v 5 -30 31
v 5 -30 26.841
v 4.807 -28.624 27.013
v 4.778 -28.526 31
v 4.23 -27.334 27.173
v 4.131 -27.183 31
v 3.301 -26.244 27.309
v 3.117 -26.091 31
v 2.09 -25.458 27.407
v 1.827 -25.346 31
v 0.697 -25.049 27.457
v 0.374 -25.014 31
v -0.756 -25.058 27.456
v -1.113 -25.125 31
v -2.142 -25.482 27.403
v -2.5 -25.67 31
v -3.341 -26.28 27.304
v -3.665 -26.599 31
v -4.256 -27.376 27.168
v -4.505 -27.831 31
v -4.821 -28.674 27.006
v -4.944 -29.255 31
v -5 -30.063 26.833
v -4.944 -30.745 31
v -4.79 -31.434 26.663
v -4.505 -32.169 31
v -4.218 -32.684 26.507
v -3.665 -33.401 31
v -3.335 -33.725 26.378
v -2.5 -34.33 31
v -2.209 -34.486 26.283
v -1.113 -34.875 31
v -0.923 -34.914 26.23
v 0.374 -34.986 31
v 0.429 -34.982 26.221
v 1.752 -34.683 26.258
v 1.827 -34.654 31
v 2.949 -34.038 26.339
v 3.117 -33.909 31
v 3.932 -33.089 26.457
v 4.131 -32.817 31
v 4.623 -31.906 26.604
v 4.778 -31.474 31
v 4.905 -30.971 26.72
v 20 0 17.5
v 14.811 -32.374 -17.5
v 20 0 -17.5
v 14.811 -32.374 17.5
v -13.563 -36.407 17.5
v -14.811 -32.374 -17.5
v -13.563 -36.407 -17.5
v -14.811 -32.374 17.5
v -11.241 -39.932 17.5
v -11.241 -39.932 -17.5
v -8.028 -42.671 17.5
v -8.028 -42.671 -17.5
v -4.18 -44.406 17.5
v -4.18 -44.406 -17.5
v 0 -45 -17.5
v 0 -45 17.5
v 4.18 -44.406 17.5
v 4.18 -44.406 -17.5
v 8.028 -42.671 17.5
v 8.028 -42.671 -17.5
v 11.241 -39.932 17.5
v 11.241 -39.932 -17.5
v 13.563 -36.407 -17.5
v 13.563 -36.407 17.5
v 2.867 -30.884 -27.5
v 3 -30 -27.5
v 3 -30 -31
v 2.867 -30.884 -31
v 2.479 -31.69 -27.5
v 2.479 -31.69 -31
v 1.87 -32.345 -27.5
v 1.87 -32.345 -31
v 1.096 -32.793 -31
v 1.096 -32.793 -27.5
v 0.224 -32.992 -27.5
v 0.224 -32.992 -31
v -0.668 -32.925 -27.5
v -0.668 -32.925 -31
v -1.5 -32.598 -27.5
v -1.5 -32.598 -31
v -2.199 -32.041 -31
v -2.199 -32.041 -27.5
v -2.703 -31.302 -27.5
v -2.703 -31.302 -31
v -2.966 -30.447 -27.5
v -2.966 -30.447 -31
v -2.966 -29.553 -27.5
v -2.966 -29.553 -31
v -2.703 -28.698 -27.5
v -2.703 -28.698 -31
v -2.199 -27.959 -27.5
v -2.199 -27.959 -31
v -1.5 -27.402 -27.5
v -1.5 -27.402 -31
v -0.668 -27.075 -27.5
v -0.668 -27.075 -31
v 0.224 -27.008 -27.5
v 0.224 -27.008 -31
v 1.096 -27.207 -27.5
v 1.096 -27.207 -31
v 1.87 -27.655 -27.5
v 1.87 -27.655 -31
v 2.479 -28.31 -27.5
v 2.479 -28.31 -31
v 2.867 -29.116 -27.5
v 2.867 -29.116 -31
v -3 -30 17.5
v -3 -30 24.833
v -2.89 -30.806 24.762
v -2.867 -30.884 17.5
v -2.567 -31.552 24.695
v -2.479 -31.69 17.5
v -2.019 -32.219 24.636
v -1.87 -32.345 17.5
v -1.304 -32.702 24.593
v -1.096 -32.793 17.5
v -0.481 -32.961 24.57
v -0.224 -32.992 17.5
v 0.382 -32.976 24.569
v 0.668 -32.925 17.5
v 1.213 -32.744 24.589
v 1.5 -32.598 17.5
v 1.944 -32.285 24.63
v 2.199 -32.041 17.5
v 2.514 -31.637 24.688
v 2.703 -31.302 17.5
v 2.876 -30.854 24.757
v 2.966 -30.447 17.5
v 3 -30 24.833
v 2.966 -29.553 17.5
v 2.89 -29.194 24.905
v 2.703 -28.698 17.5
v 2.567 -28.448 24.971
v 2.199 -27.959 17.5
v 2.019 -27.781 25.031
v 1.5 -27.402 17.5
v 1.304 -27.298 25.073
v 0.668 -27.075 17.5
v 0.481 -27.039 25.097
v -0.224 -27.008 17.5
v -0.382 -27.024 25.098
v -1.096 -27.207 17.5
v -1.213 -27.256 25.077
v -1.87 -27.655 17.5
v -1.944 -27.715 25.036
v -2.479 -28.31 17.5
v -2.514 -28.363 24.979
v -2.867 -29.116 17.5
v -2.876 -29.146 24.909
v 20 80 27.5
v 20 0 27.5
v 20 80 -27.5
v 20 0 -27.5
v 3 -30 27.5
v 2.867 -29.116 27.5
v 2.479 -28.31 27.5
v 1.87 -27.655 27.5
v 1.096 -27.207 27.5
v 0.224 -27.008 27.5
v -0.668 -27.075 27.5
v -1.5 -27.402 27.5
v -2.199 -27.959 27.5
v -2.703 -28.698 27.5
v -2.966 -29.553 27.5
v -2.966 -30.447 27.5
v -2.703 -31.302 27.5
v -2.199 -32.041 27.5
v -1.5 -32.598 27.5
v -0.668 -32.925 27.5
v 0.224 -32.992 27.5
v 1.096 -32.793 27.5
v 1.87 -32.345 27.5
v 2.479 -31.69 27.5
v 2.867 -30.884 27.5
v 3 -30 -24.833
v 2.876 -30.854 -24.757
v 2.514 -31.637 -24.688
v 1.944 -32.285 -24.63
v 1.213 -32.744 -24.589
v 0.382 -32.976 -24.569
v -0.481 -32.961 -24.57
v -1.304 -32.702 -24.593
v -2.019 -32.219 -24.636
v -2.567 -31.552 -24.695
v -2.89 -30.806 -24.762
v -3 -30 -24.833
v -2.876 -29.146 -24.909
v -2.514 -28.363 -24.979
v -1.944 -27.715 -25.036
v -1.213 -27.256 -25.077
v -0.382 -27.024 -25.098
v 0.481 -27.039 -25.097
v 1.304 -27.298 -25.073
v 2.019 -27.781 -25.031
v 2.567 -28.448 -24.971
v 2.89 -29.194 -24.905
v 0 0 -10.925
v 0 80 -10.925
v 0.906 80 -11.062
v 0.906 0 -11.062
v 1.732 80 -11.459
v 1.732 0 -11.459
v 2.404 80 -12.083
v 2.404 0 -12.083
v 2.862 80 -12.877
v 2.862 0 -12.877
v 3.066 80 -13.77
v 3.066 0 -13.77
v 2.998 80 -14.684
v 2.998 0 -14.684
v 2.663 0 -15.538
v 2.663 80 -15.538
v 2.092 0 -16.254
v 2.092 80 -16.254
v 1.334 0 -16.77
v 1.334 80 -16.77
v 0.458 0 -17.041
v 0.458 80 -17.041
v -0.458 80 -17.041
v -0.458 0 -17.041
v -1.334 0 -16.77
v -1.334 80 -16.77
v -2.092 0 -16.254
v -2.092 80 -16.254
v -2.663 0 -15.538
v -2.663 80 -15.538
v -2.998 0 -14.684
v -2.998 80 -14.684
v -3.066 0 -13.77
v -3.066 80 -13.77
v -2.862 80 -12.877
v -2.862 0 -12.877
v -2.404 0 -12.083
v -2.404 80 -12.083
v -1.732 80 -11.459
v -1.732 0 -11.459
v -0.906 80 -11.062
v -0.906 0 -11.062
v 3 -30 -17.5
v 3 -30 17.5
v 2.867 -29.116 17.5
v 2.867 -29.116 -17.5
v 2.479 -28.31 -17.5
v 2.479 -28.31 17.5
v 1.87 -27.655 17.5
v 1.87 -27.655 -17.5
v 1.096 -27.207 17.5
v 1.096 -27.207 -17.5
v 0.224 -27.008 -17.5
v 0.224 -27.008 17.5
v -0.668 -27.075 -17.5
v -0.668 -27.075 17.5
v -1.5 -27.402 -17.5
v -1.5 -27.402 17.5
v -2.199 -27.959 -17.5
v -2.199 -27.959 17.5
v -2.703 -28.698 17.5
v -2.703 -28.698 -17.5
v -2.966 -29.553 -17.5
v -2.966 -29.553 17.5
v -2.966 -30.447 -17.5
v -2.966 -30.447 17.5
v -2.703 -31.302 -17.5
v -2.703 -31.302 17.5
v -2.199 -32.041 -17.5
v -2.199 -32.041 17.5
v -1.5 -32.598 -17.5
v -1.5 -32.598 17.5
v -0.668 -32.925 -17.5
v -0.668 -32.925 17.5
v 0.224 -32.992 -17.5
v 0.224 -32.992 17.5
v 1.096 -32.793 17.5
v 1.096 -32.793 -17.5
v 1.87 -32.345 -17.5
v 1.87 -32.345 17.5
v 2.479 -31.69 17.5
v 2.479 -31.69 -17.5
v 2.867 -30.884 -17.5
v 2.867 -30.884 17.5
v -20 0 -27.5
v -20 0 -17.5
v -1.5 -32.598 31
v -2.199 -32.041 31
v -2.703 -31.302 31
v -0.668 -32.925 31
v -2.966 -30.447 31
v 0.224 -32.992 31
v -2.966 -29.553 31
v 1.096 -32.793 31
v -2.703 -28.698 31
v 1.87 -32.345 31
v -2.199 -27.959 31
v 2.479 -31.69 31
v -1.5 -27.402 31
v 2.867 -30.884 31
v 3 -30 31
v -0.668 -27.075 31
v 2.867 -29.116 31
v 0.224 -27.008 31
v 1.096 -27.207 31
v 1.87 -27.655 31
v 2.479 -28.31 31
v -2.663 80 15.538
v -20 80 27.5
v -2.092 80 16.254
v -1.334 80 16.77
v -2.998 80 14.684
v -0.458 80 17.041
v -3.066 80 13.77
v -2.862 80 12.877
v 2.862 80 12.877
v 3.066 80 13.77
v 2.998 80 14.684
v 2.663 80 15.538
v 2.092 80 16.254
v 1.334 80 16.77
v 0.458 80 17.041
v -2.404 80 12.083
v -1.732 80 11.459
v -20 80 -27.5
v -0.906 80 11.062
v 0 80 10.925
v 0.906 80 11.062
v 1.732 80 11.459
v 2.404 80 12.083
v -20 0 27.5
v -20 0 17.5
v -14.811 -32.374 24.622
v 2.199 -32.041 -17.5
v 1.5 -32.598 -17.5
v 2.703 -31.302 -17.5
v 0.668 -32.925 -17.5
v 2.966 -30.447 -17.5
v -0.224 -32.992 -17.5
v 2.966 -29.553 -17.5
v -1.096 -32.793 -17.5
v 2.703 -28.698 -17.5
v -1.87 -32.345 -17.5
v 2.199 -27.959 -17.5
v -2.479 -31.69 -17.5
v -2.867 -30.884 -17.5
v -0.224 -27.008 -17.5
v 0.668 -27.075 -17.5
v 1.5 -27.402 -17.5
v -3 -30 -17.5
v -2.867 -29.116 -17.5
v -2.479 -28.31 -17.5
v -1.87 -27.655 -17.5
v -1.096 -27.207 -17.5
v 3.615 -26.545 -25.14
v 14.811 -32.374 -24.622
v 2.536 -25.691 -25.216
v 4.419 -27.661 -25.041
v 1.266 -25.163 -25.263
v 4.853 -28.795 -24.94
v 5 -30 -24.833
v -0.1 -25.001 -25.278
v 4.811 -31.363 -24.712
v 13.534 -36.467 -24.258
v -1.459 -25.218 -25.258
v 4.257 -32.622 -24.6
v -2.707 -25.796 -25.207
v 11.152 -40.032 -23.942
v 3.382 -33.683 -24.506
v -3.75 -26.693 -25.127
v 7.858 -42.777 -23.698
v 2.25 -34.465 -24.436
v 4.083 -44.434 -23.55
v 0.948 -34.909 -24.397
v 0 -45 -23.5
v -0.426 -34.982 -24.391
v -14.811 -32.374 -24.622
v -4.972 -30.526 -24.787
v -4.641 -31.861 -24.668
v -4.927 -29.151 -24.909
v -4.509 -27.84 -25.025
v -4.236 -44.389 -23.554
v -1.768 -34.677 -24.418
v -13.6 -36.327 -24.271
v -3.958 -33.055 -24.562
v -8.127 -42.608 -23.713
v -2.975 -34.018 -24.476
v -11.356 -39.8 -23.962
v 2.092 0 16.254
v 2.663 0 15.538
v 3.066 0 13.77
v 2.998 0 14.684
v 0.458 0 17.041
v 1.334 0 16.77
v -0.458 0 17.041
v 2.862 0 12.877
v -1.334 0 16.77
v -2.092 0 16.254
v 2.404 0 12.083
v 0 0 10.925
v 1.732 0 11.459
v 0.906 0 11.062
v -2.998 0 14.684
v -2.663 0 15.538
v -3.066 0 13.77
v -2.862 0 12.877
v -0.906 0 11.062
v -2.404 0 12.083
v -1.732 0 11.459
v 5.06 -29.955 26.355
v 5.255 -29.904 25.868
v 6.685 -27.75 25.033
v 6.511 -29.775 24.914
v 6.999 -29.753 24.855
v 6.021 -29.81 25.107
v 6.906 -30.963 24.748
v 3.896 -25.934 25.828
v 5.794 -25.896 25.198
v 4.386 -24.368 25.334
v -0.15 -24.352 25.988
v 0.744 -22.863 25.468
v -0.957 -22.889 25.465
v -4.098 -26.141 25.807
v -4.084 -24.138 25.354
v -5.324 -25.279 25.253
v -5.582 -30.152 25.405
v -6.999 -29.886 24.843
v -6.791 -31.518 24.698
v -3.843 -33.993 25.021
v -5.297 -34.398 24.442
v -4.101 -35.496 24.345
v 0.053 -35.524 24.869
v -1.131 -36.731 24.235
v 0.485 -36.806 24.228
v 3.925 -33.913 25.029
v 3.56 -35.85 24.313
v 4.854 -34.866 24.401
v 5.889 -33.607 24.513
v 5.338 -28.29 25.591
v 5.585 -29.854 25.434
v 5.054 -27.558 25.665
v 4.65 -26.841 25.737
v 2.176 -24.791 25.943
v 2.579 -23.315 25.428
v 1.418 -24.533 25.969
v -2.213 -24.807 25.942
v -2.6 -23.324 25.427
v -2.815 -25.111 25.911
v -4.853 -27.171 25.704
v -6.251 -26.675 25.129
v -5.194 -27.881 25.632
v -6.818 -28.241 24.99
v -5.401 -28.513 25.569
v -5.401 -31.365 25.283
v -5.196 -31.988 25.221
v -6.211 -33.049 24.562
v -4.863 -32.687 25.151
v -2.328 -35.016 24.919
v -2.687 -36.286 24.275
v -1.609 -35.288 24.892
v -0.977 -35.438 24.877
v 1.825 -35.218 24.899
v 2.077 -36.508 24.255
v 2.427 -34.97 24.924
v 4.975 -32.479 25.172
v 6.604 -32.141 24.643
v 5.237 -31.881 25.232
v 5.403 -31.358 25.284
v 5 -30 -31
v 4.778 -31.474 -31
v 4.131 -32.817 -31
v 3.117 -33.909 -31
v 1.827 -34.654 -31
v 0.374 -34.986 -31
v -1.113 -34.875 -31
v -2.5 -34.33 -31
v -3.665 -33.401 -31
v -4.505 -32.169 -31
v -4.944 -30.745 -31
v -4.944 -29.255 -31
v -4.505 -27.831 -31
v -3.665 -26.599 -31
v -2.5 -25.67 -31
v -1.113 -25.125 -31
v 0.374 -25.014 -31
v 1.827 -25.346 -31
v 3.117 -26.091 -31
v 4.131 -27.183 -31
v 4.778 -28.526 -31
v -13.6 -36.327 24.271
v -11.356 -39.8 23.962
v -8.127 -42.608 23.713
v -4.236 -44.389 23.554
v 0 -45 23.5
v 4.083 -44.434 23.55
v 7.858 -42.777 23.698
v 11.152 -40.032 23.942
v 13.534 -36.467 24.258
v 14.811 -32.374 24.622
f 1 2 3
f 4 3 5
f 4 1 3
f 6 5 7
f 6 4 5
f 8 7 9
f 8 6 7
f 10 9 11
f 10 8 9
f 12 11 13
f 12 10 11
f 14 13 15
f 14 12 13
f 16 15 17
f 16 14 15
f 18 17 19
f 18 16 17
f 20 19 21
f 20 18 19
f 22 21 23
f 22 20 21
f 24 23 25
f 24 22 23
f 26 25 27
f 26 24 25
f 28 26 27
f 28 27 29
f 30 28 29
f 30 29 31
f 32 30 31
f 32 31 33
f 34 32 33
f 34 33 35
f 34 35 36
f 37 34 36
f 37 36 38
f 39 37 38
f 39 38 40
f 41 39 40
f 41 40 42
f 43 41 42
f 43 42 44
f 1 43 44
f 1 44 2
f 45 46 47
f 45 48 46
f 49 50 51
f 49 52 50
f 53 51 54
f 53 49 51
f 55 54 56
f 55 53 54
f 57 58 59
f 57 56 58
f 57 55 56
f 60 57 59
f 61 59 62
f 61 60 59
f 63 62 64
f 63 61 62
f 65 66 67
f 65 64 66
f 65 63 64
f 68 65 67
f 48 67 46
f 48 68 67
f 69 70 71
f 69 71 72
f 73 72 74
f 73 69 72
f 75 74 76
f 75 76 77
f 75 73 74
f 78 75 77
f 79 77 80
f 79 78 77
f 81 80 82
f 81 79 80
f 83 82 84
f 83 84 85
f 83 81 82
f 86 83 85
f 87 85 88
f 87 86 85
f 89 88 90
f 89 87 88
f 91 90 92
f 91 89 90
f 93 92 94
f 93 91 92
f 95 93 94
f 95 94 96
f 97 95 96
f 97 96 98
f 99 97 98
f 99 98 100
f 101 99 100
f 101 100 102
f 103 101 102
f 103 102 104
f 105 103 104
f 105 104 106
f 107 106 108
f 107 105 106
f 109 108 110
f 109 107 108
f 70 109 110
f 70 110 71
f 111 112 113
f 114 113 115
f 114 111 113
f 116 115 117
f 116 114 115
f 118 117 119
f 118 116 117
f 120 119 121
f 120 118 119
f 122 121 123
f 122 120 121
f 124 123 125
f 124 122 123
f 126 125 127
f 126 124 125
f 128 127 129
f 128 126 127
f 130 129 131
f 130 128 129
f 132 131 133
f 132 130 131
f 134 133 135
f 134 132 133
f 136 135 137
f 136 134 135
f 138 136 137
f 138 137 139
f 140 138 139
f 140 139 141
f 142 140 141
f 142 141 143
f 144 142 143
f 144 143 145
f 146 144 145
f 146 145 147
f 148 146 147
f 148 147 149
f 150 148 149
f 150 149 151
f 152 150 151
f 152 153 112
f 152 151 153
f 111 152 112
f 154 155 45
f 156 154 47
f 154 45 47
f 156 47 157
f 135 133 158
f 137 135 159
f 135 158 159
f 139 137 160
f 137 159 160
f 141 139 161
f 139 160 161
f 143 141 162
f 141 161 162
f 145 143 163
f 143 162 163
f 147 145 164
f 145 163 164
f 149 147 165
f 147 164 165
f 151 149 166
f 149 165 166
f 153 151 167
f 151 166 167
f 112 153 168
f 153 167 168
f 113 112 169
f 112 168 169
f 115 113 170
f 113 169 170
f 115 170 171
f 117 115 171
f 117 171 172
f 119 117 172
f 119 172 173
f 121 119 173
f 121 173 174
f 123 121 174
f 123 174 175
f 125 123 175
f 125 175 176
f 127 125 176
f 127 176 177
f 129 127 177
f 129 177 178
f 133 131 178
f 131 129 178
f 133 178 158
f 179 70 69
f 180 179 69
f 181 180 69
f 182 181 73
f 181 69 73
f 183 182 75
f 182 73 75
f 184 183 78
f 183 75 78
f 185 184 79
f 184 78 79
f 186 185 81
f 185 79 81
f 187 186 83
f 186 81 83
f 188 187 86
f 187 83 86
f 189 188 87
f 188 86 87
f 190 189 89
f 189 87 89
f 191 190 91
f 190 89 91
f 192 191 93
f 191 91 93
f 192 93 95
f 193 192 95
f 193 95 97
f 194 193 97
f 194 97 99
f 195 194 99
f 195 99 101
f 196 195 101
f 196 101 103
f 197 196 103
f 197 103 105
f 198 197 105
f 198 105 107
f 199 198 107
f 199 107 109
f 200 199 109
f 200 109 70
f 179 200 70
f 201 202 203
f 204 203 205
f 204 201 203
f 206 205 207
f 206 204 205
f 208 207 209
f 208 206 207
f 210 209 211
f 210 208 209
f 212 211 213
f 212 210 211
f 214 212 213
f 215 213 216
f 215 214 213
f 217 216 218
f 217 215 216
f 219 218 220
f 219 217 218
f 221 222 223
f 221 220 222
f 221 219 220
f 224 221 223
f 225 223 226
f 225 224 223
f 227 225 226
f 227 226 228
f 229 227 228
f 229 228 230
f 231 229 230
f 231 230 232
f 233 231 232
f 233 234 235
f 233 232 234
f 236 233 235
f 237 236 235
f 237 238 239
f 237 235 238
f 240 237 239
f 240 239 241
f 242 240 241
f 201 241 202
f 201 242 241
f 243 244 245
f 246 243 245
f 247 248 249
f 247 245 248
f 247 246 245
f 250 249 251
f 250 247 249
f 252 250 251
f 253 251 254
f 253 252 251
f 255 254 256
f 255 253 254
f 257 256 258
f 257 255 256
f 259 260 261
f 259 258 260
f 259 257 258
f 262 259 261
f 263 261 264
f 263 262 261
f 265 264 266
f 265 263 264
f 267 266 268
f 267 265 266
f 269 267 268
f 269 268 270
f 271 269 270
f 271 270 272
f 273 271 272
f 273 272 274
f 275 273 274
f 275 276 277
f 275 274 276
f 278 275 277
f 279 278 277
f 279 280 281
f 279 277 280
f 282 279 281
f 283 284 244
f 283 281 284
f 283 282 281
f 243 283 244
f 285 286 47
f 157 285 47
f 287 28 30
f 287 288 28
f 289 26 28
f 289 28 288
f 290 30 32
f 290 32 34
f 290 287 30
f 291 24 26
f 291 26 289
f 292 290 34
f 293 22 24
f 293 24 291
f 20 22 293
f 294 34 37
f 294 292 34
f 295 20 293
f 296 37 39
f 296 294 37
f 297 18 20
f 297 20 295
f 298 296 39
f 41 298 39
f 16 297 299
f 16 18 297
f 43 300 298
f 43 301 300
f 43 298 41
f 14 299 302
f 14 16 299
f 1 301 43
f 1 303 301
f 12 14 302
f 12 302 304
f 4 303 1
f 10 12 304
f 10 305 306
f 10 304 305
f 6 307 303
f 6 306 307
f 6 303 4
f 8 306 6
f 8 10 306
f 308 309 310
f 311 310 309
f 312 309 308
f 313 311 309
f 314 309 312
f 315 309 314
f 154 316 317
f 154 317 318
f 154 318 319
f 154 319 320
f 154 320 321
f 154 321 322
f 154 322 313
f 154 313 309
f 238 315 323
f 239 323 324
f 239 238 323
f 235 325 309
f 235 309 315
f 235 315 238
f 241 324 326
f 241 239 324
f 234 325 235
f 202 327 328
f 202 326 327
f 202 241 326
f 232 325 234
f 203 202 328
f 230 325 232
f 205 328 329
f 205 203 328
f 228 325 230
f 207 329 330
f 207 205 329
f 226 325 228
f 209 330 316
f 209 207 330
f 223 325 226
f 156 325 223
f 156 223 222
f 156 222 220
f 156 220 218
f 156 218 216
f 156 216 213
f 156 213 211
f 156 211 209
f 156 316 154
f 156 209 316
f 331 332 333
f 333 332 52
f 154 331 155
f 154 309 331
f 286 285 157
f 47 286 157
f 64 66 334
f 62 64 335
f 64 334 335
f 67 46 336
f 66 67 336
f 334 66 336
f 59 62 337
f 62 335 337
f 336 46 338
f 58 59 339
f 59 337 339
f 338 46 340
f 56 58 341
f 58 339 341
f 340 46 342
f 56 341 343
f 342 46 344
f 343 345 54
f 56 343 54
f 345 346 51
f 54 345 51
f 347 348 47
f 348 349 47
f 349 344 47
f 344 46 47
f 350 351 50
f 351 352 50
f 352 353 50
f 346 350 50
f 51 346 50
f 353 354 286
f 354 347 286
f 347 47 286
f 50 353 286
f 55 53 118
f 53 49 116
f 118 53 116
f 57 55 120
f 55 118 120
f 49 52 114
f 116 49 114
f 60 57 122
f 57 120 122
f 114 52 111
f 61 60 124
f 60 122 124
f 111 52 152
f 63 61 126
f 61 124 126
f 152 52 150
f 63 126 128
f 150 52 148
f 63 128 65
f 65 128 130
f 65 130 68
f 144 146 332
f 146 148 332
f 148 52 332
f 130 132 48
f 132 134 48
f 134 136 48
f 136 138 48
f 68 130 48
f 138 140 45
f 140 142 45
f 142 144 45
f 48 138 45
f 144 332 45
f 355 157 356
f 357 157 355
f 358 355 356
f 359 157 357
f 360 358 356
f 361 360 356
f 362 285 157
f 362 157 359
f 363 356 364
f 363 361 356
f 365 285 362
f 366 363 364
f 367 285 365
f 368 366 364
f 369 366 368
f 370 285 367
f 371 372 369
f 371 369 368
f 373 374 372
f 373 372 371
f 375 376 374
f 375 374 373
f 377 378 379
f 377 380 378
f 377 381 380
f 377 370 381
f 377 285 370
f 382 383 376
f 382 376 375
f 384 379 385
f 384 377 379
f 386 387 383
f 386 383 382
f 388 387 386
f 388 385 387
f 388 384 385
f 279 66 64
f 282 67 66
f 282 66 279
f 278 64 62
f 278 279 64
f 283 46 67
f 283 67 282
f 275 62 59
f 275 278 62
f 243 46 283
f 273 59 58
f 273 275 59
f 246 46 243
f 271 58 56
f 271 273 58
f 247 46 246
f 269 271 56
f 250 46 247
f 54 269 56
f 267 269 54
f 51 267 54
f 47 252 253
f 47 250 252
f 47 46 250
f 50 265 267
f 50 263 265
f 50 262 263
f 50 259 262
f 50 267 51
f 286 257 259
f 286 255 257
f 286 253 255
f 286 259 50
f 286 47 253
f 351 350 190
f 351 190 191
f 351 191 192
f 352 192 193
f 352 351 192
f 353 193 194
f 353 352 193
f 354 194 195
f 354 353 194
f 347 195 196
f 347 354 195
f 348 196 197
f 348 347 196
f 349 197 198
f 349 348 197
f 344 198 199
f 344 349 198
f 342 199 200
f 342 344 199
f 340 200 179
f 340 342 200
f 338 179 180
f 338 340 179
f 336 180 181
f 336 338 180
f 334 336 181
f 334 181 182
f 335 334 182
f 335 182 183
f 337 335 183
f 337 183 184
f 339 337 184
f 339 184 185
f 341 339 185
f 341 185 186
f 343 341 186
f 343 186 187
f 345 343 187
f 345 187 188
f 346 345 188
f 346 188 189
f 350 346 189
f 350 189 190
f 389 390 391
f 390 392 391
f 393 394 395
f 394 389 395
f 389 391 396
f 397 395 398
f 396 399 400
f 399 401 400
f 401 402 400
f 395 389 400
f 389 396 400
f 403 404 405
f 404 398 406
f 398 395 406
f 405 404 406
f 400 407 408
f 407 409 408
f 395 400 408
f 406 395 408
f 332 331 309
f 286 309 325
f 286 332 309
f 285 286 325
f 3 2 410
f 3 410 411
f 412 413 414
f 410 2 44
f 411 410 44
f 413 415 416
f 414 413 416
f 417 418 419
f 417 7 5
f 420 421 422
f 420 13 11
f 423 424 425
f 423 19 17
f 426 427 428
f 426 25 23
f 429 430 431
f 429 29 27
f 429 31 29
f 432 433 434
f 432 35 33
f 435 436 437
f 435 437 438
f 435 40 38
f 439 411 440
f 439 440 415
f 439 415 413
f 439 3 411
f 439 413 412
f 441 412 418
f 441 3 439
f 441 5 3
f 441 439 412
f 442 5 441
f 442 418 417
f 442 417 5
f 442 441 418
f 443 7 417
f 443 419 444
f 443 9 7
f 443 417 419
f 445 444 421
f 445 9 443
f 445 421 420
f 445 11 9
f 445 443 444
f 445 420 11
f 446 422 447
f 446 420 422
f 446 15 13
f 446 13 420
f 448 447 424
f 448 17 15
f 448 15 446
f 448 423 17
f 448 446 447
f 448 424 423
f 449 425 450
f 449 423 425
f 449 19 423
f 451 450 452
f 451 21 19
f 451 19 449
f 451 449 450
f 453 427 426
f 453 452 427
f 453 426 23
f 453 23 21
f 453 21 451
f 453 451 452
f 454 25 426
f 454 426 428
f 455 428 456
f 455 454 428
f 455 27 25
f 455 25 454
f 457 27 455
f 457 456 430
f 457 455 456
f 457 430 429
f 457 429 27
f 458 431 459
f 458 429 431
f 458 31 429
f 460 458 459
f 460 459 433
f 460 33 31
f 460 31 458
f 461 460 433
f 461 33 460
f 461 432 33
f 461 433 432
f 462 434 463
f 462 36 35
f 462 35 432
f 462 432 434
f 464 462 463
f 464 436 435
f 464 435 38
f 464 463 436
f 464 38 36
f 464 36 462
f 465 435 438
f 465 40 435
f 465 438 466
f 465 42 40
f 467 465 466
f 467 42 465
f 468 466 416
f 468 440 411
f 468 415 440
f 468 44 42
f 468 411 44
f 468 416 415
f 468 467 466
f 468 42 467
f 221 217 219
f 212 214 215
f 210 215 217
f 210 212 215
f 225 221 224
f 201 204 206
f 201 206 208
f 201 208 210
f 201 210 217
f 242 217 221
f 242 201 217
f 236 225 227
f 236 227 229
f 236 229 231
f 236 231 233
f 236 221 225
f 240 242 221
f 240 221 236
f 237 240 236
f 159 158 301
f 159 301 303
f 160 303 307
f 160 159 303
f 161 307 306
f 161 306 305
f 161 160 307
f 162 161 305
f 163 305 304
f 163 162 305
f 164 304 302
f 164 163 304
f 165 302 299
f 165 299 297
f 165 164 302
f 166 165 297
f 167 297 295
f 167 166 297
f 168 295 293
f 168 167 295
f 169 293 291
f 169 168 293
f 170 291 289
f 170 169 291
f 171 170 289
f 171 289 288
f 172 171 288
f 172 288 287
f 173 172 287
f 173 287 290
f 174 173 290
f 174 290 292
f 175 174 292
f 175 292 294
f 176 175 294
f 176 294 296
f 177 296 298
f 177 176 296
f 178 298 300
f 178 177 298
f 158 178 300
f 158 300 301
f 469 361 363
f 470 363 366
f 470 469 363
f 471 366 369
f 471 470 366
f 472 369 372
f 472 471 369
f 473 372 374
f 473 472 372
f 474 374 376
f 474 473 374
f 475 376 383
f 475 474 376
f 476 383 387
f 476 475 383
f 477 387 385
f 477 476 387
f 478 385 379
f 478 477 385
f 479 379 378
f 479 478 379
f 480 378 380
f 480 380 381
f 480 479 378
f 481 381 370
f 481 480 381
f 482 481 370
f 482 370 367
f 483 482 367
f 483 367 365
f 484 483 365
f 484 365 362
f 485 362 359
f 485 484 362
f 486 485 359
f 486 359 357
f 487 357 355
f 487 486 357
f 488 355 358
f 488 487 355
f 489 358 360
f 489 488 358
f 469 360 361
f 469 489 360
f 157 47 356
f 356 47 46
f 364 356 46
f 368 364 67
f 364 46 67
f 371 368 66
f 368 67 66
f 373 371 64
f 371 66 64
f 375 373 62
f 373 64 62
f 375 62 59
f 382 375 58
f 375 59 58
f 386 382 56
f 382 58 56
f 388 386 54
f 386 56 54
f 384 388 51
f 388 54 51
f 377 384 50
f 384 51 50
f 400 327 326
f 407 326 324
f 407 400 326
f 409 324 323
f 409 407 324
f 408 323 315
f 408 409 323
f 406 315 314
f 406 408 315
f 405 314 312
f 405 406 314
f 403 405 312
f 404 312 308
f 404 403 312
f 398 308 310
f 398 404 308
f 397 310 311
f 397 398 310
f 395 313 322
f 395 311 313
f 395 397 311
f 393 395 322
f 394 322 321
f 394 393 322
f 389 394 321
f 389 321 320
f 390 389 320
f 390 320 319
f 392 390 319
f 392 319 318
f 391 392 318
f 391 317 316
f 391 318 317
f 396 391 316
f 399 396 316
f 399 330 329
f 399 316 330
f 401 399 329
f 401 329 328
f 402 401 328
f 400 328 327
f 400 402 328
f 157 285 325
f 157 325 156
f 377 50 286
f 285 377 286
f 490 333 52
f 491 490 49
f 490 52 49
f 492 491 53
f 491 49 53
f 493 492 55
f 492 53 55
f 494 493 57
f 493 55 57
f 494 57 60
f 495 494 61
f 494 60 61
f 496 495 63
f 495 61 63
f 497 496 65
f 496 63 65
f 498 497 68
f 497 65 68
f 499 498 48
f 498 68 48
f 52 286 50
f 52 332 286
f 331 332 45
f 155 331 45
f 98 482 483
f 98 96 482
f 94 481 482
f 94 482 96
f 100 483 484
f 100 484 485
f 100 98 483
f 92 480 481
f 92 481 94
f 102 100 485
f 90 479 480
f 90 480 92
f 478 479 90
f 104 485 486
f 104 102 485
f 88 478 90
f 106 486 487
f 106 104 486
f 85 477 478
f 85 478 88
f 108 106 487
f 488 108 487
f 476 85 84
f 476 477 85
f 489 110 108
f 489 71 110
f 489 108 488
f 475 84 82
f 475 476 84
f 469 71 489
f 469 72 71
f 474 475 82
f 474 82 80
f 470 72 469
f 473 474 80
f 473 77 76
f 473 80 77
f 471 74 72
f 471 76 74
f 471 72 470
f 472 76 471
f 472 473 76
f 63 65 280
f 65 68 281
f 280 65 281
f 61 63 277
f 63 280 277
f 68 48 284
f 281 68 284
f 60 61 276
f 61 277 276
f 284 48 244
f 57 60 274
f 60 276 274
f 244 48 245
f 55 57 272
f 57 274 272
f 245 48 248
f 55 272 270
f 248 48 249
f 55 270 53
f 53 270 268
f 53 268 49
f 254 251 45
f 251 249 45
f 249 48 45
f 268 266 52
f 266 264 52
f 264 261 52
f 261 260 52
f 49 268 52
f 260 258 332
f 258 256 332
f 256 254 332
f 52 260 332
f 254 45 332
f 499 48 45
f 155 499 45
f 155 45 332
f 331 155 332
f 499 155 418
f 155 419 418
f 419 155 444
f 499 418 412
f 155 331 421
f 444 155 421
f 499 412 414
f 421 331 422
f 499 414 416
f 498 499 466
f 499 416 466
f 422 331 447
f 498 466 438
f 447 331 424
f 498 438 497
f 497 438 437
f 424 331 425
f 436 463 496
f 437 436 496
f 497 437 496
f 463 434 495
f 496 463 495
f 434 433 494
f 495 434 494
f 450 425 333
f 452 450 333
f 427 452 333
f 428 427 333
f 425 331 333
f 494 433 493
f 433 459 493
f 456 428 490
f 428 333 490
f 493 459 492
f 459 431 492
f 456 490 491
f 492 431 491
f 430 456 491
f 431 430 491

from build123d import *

# Parameters (mm, degrees)
CROQUIS1_W                          = 40
CROQUIS1_H                          = 55
SALIENTE_EXTRUIR1_DEPTH             = 80
CROQUIS2_R                          = 3.075
CORTAR_EXTRUIR2_DEPTH               = 87.926693254
SALIENTE_EXTRUIR2_REACH             = 88.927
SALIENTE_EXTRUIR2_DIRECTION_2_REACH = 88.927
CORTAR_EXTRUIR6_DEPTH               = 87.926693254
CORTAR_EXTRUIR6_DEPTH_BACK          = 87.926693254
CROQUIS6_R                          = 3
CORTAR_EXTRUIR10_DEPTH              = 10
CROQUIS11_R                         = 3
SALIENTE_EXTRUIR3_DEPTH             = 10
CORTAR_EXTRUIR11_DEPTH              = 87.926693254
CORTAR_EXTRUIR11_DEPTH_BACK         = 87.926693254
CORTAR_EXTRUIR15_START              = -10
CORTAR_EXTRUIR15_DEPTH              = 10
CROQUIS17_R                         = 3
SALIENTE_EXTRUIR4_DEPTH             = 10
CORTAR_EXTRUIR16_DEPTH              = 87.926693254
CORTAR_EXTRUIR16_DEPTH_BACK         = 87.926693254
CROQUIS21_R                         = 5
CROQUIS21_R_2                       = 3
SALIENTE_EXTRUIR5_DEPTH             = 3.5
SALIENTE_EXTRUIR5_DIRECTION_2_REACH = 101.121
REDONDEO1_R                         = 2
CROQUIS22_R                         = 5
CROQUIS22_R_2                       = 3
SALIENTE_EXTRUIR6_DEPTH             = 3.5
SALIENTE_EXTRUIR6_DIRECTION_2_REACH = 103.105


with BuildPart() as part:
    # Croquis1 → Saliente-Extruir1 (new body)
    with BuildSketch(Plane(origin=(0, 0, 0), x_dir=(1, 0, 0), z_dir=(0, 1, 0))):
        Rectangle(CROQUIS1_W, CROQUIS1_H)
    extrude(amount=SALIENTE_EXTRUIR1_DEPTH)

    # Croquis2 → Cortar-Extruir2 (cut, through all)
    with BuildSketch(Plane(origin=(0, 0, 0), x_dir=(1, 0, 0), z_dir=(0, 1, 0))):
        with Locations(Location((0, 14, 0), (0, 0, 270))):
            Circle(CROQUIS2_R)
        with Locations(Location((0, -14, 0), (0, 0, 90))):
            Circle(CROQUIS2_R)
    extrude(amount=CORTAR_EXTRUIR2_DEPTH, mode=Mode.SUBTRACT)

    # Saliente-Extruir2: up to this face of the body (flat: up to its plane)
    saliente_extruir2_end = Plane(part.part.faces().sort_by_distance((0, 40, 27.5))[0])
    # Croquis5 → Saliente-Extruir2 (add, up to the picked face)
    with BuildSketch(Plane.XY, mode=Mode.PRIVATE) as saliente_extruir2_sk1:
        with BuildLine():
            Line((-20, 0), (-14.810951292, -32.373967528))
            ThreePointArc((-14.810951292, -32.373967528), (0, -45), (14.810951292, -32.373967528))
            Line((14.810951292, -32.373967528), (20, 0))
            Line((20, 0), (-20, 0))
        make_face()
    saliente_extruir2_tool1 = split(extrude(saliente_extruir2_sk1.sketch, amount=SALIENTE_EXTRUIR2_REACH, mode=Mode.PRIVATE), bisect_by=saliente_extruir2_end, keep=Keep.BOTH, mode=Mode.PRIVATE)
    add(saliente_extruir2_tool1.solids().sort_by(Axis((0, -19.849245, 0), (0, 0, 1)))[0])

    # Saliente-Extruir2 direction 2: up to this face of the body (flat: up to its plane)
    saliente_extruir2_direction_2_end = Plane(part.part.faces().sort_by_distance((0, 40, -27.5))[0])
    # Croquis5 → Saliente-Extruir2 direction 2 (add, up to the picked face)
    with BuildSketch(Plane.XY, mode=Mode.PRIVATE) as saliente_extruir2_direction_2_sk1:
        with BuildLine():
            Line((-20, 0), (-14.810951292, -32.373967528))
            ThreePointArc((-14.810951292, -32.373967528), (0, -45), (14.810951292, -32.373967528))
            Line((14.810951292, -32.373967528), (20, 0))
            Line((20, 0), (-20, 0))
        make_face()
    saliente_extruir2_direction_2_tool1 = split(extrude(saliente_extruir2_direction_2_sk1.sketch, amount=-SALIENTE_EXTRUIR2_DIRECTION_2_REACH, mode=Mode.PRIVATE), bisect_by=saliente_extruir2_direction_2_end, keep=Keep.BOTH, mode=Mode.PRIVATE)
    add(saliente_extruir2_direction_2_tool1.solids().sort_by(Axis((0, -19.849245, 0), (0, 0, -1)))[0])

    # Croquis6 → Cortar-Extruir6 (cut, two sides: drawn at the far end of the back side and taken through both)
    with BuildSketch(Plane.XY.offset(-CORTAR_EXTRUIR6_DEPTH_BACK)):
        with Locations((0, -30)):
            Circle(CROQUIS6_R)
    extrude(amount=CORTAR_EXTRUIR6_DEPTH + CORTAR_EXTRUIR6_DEPTH_BACK, mode=Mode.SUBTRACT)

    # Croquis10 → Cortar-Extruir10 (cut)
    with BuildSketch(Plane(origin=(0, 0, -27.5), x_dir=(-1, 0, 0), z_dir=(0, 0, -1))):
        with BuildLine():
            Line((14.810951292, -32.373967528), (20, 0))
            Line((20, 0), (-20, 0))
            Line((-20, 0), (-14.810951292, -32.373967528))
            ThreePointArc((-14.810951292, -32.373967528), (0, -45), (14.810951292, -32.373967528))
        make_face()
    extrude(amount=-CORTAR_EXTRUIR10_DEPTH, mode=Mode.SUBTRACT)

    # Croquis16 → Cortar-Extruir15 (cut)
    with BuildSketch(Plane.XY.offset(27.5).offset(CORTAR_EXTRUIR15_START)):
        with BuildLine():
            Line((-20, 0), (20, 0))
            Line((20, 0), (14.810951292, -32.373967528))
            ThreePointArc((14.810951292, -32.373967528), (0, -45), (-14.810951292, -32.373967528))
            Line((-14.810951292, -32.373967528), (-20, 0))
        make_face()
    extrude(amount=CORTAR_EXTRUIR15_DEPTH, mode=Mode.SUBTRACT)


with BuildPart() as body_2:
    # Croquis11 → Saliente-Extruir3 (new body)
    with BuildSketch(Plane(origin=(0, 0, -17.5), x_dir=(-1, 0, 0), z_dir=(0, 0, -1))):
        with BuildLine():
            Line((20, 0), (-20, 0))
            Line((-20, 0), (-14.810951292, -32.373967528))
            ThreePointArc((-14.810951292, -32.373967528), (0, -45), (14.810951292, -32.373967528))
            Line((14.810951292, -32.373967528), (20, 0))
        make_face()
        with Locations((0, -30)):
            Circle(CROQUIS11_R, mode=Mode.SUBTRACT)
    extrude(amount=SALIENTE_EXTRUIR3_DEPTH)

    # Croquis12 → Cortar-Extruir11 (cut, two sides: drawn at the far end of the back side and taken through both)
    with BuildSketch(Plane(origin=(0, 0, 0), x_dir=(0, 0, -1), z_dir=(1, 0, 0)).offset(-CORTAR_EXTRUIR11_DEPTH_BACK)):
        with BuildLine():
            Line((27.5, 0), (23.5, -45))
            add(Edge.make_bspline(
                [(23.5, -45), (53.895048744, -65.691423054), (27.5, 0)],
                knots=[0, 0, 0, 1, 1, 1], degree=2))
        make_face()
    extrude(amount=CORTAR_EXTRUIR11_DEPTH + CORTAR_EXTRUIR11_DEPTH_BACK, mode=Mode.SUBTRACT)

    # Croquis22 → Saliente-Extruir6 (add)
    with BuildSketch(Plane(origin=(0, 0, -27.5), x_dir=(-1, 0, 0), z_dir=(0, 0, -1))):
        with Locations(Location((0, -30, 0), (0, 0, 180))):
            Circle(CROQUIS22_R)
        with Locations(Location((0, -30, 0), (0, 0, 180))):
            Circle(CROQUIS22_R_2, mode=Mode.SUBTRACT)
    extrude(amount=SALIENTE_EXTRUIR6_DEPTH)

    # Saliente-Extruir6 direction 2: up to this face of the body (flat: up to its plane)
    saliente_extruir6_direction_2_end = Plane(body_2.part.faces().sort_by_distance((0, -19.641450964, -25.754093248))[0])
    # Croquis22 → Saliente-Extruir6 direction 2 (add, up to the picked face)
    with BuildSketch(Plane(origin=(0, 0, -27.5), x_dir=(-1, 0, 0), z_dir=(0, 0, -1)), mode=Mode.PRIVATE) as saliente_extruir6_direction_2_sk1:
        with Locations(Location((0, -30, 0), (0, 0, 180))):
            Circle(CROQUIS22_R)
        with Locations(Location((0, -30, 0), (0, 0, 180))):
            Circle(CROQUIS22_R_2, mode=Mode.SUBTRACT)
    saliente_extruir6_direction_2_tool1 = split(extrude(saliente_extruir6_direction_2_sk1.sketch, amount=-SALIENTE_EXTRUIR6_DIRECTION_2_REACH, mode=Mode.PRIVATE), bisect_by=saliente_extruir6_direction_2_end, keep=Keep.BOTH, mode=Mode.PRIVATE)
    add(saliente_extruir6_direction_2_tool1.solids().sort_by(Axis((-4.858579, -30, -27.5), (0, 0, 1)))[0])


with BuildPart() as body_3:
    # Croquis17 → Saliente-Extruir4 (new body)
    with BuildSketch(Plane.XY.offset(17.5)):
        with BuildLine():
            Line((14.810951292, -32.373967528), (20, 0))
            Line((20, 0), (-20, 0))
            Line((-20, 0), (-14.810951292, -32.373967528))
            ThreePointArc((-14.810951292, -32.373967528), (0, -45), (14.810951292, -32.373967528))
        make_face()
        with Locations(Location((0, -30, 0), (0, 0, 180))):
            Circle(CROQUIS17_R, mode=Mode.SUBTRACT)
    extrude(amount=SALIENTE_EXTRUIR4_DEPTH)

    # Croquis18 → Cortar-Extruir16 (cut, two sides: drawn at the far end of the back side and taken through both)
    with BuildSketch(Plane(origin=(0, 0, 0), x_dir=(0, 0, -1), z_dir=(1, 0, 0)).offset(-CORTAR_EXTRUIR16_DEPTH_BACK)):
        with BuildLine():
            Line((-27.5, 0), (-23.5, -45))
            add(Edge.make_bspline(
                [(-23.5, -45), (-50.99373039, -70.964066745), (-27.5, 0)],
                knots=[0, 0, 0, 1, 1, 1], degree=2))
        make_face()
    extrude(amount=CORTAR_EXTRUIR16_DEPTH + CORTAR_EXTRUIR16_DEPTH_BACK, mode=Mode.SUBTRACT)

    # Croquis21 → Saliente-Extruir5 (add)
    with BuildSketch(Plane.XY.offset(27.5)):
        with Locations((0, -30)):
            Circle(CROQUIS21_R)
        with Locations((0, -30)):
            Circle(CROQUIS21_R_2, mode=Mode.SUBTRACT)
    extrude(amount=SALIENTE_EXTRUIR5_DEPTH)

    # Saliente-Extruir5 direction 2: up to this face of the body (flat: up to its plane)
    saliente_extruir5_direction_2_end = Plane(body_3.part.faces().sort_by_distance((0, -19.641450964, 25.754093248))[0])
    # Croquis21 → Saliente-Extruir5 direction 2 (add, up to the picked face)
    with BuildSketch(Plane.XY.offset(27.5), mode=Mode.PRIVATE) as saliente_extruir5_direction_2_sk1:
        with Locations((0, -30)):
            Circle(CROQUIS21_R)
        with Locations((0, -30)):
            Circle(CROQUIS21_R_2, mode=Mode.SUBTRACT)
    saliente_extruir5_direction_2_tool1 = split(extrude(saliente_extruir5_direction_2_sk1.sketch, amount=-SALIENTE_EXTRUIR5_DIRECTION_2_REACH, mode=Mode.PRIVATE), bisect_by=saliente_extruir5_direction_2_end, keep=Keep.BOTH, mode=Mode.PRIVATE)
    add(saliente_extruir5_direction_2_tool1.solids().sort_by(Axis((-4.858579, -30, 27.5), (0, 0, -1)))[0])

    # Redondeo1
    redondeo1_edges = [body_3.edges().sort_by_distance(p)[0] for p in [
        (-5, -30.00000001, 24.833333332),
    ]]
    fillet(redondeo1_edges, radius=REDONDEO1_R)


solid = Compound([part.part, body_2.part, body_3.part])
